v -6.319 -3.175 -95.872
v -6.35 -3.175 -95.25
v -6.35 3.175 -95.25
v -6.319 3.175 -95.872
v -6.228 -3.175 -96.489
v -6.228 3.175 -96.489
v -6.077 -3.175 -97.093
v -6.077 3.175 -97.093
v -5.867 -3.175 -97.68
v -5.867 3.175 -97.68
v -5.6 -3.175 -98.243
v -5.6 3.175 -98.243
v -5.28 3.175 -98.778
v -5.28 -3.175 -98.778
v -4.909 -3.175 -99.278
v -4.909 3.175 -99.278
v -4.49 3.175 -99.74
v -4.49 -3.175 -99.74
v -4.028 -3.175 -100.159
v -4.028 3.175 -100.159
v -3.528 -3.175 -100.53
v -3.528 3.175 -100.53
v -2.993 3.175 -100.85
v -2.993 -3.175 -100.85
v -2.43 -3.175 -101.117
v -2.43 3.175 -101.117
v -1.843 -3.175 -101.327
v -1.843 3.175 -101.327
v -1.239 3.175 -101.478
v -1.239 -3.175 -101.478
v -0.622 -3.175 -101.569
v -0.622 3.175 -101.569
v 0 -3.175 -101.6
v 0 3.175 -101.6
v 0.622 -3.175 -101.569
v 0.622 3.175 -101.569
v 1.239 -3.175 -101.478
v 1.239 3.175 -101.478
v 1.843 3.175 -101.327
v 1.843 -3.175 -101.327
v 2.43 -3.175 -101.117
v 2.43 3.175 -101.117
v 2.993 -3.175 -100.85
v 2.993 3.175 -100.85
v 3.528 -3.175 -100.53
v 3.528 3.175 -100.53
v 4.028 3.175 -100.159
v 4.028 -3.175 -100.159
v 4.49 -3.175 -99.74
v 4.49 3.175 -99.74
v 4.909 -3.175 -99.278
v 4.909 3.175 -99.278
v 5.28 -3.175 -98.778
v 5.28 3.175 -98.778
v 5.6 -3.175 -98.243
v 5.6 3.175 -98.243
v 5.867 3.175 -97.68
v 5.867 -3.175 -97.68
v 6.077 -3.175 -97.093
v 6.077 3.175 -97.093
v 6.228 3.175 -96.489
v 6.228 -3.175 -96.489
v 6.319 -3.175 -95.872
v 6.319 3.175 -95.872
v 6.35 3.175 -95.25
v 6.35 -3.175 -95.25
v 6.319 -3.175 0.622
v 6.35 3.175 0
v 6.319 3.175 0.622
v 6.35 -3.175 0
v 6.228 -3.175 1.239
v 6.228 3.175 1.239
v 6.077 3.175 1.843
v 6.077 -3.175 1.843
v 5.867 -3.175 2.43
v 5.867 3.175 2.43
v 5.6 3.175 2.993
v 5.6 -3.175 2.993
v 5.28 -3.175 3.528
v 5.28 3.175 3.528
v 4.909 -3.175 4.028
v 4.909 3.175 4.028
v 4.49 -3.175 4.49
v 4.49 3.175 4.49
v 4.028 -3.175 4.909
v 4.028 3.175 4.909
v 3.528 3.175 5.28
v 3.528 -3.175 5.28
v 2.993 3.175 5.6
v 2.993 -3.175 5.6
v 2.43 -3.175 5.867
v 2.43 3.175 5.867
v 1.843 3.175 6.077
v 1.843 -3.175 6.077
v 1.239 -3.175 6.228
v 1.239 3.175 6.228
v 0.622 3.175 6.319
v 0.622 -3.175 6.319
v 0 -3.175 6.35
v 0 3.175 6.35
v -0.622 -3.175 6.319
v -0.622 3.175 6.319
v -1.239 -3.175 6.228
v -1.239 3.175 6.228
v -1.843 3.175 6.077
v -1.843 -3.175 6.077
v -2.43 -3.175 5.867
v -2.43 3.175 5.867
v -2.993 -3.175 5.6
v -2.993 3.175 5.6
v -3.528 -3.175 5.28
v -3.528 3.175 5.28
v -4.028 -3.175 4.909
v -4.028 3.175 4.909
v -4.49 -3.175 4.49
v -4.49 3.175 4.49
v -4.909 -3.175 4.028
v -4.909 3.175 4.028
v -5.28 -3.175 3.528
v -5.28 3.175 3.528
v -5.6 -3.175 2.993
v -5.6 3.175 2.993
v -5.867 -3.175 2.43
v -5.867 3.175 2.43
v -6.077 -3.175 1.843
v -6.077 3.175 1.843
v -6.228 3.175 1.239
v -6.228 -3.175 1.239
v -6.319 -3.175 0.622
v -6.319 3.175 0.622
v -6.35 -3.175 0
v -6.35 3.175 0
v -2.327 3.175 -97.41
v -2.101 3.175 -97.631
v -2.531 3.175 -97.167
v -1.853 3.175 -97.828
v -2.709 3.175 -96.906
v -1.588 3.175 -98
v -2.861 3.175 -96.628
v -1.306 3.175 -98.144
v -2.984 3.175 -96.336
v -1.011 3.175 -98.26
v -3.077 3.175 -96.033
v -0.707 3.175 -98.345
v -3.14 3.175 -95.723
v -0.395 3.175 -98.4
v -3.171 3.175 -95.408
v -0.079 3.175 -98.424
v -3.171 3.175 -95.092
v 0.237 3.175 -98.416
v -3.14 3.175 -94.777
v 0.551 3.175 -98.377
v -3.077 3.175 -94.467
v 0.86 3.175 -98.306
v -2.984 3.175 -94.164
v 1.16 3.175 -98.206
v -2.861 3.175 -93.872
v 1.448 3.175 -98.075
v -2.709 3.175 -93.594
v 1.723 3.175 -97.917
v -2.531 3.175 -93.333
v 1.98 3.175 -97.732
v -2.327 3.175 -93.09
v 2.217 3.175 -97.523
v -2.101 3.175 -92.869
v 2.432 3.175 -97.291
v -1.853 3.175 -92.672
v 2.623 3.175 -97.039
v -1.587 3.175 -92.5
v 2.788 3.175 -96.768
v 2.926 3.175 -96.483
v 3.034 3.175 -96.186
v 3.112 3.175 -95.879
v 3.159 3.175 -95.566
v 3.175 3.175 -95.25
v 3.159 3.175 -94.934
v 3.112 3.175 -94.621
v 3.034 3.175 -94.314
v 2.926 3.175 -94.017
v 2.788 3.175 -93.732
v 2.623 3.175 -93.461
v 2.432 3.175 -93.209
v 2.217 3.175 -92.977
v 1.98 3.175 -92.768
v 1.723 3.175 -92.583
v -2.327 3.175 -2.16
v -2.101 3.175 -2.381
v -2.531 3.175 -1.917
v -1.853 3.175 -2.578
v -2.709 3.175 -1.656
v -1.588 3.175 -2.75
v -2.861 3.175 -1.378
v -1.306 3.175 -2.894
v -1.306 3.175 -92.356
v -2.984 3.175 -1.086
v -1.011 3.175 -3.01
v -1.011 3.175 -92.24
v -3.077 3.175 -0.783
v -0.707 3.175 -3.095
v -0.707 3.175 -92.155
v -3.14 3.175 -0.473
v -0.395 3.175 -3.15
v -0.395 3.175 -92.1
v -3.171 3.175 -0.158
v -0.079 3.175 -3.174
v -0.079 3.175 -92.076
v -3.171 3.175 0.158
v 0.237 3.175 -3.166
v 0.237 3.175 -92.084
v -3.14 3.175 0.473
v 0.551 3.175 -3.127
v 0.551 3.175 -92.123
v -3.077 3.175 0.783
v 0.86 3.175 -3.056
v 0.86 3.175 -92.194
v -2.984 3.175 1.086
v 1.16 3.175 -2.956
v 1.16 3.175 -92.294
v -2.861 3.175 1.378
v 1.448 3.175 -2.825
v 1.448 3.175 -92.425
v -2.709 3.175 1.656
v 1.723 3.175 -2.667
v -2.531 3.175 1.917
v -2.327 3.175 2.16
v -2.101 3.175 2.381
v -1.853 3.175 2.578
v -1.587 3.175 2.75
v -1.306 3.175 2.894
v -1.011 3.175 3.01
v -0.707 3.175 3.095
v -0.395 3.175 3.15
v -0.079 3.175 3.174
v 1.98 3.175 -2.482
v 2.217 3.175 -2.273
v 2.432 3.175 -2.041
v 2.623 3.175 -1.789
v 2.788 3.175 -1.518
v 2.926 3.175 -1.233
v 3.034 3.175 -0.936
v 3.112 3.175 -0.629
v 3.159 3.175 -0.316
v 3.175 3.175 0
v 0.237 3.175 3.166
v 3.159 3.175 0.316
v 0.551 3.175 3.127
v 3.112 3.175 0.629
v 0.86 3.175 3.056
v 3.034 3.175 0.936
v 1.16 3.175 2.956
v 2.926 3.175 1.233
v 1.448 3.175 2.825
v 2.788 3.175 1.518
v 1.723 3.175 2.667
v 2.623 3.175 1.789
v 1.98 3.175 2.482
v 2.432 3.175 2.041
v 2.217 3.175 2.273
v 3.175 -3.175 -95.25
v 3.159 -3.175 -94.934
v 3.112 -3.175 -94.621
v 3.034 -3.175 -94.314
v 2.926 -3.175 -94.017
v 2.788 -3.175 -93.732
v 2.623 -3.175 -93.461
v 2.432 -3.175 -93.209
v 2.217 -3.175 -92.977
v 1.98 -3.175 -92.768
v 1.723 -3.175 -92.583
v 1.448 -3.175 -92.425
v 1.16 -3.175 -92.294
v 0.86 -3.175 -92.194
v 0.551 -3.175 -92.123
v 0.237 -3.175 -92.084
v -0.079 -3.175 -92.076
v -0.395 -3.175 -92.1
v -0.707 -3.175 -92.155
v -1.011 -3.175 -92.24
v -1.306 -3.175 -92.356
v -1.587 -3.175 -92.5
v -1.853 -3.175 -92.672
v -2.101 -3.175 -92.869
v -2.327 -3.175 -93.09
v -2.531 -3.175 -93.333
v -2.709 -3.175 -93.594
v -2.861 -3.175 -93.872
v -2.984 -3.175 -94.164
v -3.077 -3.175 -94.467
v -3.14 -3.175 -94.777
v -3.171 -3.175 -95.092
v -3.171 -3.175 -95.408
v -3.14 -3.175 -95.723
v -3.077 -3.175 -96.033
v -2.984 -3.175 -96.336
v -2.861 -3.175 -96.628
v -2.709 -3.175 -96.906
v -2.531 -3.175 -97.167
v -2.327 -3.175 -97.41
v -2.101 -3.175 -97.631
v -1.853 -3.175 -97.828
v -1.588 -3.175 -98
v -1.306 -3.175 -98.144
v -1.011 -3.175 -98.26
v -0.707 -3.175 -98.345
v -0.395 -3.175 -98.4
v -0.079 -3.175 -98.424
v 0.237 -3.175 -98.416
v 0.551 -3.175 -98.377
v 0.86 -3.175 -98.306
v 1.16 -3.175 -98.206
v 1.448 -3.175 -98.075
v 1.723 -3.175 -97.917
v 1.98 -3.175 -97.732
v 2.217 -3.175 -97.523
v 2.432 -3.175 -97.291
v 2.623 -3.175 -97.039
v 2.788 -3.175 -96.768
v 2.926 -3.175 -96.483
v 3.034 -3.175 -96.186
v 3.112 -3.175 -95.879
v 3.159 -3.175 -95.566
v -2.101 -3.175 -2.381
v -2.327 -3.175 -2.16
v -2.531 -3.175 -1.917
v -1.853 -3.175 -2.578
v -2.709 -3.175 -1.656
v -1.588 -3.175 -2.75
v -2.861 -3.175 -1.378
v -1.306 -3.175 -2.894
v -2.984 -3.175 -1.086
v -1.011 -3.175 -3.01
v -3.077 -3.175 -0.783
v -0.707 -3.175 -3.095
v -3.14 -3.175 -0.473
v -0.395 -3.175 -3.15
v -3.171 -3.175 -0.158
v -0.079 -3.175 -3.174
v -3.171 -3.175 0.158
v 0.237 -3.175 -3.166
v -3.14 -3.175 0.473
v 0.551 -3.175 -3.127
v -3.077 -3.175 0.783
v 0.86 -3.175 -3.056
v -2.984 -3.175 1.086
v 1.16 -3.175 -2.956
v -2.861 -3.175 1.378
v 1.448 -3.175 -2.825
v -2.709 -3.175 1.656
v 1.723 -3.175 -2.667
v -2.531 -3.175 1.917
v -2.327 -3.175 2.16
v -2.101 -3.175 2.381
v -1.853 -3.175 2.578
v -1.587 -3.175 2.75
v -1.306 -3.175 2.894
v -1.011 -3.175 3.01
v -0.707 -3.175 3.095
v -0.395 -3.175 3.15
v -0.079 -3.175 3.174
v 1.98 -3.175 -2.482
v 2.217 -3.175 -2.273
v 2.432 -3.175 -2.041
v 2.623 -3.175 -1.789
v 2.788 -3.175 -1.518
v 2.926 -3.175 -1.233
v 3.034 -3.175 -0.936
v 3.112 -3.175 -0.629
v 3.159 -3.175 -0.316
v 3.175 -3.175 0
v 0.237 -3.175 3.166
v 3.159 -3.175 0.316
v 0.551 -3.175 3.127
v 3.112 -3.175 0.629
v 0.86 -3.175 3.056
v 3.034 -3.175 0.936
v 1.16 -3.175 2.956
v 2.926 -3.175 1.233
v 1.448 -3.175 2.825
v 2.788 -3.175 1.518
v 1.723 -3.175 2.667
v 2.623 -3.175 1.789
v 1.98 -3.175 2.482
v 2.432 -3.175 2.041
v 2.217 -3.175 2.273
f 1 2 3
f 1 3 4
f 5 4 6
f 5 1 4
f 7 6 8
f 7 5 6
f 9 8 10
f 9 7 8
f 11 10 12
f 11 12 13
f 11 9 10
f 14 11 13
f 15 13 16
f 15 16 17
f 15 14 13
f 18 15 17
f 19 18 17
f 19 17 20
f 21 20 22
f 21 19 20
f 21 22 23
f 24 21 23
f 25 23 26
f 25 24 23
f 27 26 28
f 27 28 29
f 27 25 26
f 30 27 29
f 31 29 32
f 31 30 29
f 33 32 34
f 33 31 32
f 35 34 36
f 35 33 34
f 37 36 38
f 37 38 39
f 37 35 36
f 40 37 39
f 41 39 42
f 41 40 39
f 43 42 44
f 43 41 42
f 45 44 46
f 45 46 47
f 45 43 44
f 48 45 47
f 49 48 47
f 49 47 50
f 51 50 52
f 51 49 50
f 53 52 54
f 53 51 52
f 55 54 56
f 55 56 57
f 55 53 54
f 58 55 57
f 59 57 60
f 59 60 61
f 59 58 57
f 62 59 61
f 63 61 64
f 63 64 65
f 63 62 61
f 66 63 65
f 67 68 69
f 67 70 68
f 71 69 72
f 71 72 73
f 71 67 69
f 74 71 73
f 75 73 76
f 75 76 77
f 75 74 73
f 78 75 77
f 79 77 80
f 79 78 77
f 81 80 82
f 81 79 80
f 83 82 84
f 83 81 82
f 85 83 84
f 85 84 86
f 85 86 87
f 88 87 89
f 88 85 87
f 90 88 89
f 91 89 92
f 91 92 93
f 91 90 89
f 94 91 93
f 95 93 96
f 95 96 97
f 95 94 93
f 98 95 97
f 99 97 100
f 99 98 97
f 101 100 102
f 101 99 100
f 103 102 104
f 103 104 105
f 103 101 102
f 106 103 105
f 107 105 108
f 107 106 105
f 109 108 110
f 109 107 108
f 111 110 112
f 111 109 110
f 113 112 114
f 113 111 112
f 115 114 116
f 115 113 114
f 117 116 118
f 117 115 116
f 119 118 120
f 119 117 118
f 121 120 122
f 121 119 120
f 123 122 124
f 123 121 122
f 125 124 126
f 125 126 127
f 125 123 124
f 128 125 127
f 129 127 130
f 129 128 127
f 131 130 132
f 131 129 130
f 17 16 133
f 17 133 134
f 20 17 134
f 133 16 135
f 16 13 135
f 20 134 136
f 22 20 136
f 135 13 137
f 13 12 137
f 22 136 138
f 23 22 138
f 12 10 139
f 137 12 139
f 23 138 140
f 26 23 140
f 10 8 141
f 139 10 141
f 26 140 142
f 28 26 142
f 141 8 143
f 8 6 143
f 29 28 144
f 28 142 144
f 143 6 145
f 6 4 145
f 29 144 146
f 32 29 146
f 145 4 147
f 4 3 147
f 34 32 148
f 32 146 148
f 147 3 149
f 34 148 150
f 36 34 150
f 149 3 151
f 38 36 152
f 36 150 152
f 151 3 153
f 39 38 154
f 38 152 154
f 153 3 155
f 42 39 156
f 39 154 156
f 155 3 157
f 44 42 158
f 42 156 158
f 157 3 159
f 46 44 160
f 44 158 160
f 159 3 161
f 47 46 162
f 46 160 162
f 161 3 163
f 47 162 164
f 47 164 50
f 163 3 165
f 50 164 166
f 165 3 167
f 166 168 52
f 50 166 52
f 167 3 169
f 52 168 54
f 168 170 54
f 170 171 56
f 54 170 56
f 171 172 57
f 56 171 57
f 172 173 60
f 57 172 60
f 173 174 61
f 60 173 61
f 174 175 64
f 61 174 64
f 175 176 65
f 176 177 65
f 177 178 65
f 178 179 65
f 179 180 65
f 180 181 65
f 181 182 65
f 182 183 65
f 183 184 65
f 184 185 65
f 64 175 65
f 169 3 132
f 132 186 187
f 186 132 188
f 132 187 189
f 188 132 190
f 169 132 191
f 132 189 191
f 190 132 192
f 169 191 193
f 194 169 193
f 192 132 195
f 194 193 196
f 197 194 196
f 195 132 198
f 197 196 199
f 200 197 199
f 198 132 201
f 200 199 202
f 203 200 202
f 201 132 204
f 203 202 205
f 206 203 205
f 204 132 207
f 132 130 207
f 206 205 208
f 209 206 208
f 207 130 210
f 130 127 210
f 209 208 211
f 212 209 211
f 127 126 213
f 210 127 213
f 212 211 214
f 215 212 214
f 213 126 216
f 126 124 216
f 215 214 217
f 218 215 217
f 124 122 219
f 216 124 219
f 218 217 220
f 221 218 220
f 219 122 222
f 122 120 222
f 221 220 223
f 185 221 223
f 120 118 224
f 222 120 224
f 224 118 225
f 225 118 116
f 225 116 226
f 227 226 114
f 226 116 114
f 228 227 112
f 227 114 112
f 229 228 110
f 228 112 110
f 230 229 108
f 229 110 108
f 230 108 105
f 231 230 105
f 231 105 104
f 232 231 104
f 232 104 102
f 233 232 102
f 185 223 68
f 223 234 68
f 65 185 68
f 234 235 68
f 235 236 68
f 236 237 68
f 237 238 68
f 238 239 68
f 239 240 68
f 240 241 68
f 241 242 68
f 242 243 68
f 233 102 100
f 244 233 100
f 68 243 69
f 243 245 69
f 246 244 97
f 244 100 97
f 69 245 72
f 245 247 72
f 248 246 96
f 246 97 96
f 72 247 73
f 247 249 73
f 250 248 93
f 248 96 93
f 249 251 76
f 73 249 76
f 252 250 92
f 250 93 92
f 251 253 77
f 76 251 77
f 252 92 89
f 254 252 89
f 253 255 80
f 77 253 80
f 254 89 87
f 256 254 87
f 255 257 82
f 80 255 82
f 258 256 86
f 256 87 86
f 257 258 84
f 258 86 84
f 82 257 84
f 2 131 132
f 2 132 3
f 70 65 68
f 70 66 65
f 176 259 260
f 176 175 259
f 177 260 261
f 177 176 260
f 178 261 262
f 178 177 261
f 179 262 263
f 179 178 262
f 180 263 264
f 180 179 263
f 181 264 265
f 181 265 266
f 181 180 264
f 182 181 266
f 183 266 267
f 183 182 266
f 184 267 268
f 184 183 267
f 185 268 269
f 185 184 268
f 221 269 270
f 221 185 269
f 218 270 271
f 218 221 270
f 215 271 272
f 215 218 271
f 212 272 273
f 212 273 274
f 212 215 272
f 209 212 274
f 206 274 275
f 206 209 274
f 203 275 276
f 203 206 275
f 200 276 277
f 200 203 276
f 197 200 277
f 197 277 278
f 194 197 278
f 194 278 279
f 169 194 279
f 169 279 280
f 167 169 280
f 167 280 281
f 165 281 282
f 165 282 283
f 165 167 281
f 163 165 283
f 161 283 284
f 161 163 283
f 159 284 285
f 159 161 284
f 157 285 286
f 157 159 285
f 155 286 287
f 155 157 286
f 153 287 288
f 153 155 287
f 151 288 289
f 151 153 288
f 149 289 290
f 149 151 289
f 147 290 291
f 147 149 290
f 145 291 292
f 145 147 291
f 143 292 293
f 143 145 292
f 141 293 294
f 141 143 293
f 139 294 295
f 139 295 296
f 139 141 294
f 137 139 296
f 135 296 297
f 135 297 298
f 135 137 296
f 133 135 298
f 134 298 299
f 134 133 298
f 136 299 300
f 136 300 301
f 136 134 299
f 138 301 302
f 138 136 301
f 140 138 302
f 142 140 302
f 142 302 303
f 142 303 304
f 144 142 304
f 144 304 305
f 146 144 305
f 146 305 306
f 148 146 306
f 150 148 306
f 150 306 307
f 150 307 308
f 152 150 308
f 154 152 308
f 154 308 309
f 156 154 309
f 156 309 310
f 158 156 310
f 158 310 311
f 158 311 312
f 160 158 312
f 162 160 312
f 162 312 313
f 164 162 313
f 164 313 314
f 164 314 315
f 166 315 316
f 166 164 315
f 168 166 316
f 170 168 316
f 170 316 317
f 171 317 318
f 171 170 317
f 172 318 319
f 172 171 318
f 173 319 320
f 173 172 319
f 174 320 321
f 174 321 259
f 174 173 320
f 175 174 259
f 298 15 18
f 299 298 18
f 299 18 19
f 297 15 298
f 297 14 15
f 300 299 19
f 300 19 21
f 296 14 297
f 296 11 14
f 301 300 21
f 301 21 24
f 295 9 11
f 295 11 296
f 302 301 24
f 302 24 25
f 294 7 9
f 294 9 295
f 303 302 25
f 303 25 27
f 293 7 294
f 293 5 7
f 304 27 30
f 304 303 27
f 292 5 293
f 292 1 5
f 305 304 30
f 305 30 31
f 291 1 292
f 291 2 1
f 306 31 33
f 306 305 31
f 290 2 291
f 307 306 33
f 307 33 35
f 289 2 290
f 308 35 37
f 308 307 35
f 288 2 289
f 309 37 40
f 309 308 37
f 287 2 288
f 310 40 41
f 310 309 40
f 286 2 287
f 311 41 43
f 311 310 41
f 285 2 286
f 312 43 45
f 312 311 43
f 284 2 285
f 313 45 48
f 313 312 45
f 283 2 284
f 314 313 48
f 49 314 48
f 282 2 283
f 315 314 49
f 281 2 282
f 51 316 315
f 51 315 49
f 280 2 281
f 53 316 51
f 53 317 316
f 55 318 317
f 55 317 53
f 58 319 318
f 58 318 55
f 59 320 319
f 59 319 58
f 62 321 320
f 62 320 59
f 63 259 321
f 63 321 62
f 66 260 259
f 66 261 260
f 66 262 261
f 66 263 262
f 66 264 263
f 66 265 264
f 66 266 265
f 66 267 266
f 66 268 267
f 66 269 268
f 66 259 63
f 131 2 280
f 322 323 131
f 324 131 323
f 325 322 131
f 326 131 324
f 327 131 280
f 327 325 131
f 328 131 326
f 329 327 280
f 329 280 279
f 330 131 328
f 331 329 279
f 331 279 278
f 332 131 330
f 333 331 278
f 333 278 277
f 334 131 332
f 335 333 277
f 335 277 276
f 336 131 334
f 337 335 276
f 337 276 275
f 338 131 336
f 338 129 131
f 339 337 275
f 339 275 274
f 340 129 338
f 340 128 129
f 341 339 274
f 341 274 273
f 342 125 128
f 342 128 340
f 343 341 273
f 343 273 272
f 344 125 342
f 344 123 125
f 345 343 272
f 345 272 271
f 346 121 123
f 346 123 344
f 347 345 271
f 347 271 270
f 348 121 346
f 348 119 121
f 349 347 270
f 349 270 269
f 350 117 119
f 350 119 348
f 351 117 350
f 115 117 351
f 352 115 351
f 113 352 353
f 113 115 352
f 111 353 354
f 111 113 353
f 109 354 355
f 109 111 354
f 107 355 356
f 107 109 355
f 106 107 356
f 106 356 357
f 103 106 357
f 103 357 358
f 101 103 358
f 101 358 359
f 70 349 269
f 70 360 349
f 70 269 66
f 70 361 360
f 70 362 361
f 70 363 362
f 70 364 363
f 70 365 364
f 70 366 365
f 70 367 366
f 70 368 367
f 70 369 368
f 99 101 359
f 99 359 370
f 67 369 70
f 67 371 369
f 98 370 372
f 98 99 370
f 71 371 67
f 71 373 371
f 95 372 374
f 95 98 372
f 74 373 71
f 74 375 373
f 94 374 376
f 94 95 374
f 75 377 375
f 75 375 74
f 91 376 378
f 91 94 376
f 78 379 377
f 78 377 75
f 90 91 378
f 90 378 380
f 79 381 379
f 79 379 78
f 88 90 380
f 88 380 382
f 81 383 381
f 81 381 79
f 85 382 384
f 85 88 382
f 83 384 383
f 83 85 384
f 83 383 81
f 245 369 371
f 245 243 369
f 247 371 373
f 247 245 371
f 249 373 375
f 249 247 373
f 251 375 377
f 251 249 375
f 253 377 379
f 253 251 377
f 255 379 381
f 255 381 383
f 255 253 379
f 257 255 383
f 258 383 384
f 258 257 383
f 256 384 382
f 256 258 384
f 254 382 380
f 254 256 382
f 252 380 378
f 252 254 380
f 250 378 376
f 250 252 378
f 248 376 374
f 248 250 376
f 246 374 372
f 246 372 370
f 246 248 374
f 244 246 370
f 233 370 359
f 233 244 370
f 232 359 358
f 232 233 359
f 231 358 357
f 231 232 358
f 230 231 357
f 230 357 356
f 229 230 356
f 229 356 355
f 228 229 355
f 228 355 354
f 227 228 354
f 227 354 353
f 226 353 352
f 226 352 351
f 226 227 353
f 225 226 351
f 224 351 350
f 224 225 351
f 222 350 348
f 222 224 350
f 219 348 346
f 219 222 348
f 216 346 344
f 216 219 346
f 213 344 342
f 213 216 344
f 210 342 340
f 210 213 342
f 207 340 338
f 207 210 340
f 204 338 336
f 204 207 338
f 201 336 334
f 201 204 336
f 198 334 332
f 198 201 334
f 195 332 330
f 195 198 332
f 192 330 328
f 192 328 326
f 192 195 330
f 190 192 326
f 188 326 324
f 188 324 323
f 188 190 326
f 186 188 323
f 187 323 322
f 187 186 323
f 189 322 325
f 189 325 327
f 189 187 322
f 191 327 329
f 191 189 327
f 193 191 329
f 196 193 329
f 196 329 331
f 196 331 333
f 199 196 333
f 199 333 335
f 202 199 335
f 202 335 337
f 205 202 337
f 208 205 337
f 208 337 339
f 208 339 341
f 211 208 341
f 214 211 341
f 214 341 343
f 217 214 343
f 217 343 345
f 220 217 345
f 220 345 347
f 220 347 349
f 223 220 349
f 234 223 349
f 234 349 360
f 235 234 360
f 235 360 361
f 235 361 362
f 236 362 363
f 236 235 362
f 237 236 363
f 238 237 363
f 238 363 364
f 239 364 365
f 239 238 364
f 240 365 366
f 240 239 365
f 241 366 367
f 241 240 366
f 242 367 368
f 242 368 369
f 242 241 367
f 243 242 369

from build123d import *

# Parameters (mm, degrees)
F0_R     = 3.175
F1_DEPTH = 3.175


with BuildPart() as f1:
    # F0 (on Front) → F1 (new body, symmetric)
    with BuildSketch(Plane.XZ):
        with BuildLine():
            ThreePointArc((6.35, -1e-06), (0, 6.35), (-6.35, -1e-06))
            Line((-6.35, -1e-06), (-6.35, -95.25))
            ThreePointArc((-6.35, -95.25), (0, -101.6), (6.35, -95.25))
            Line((6.35, -95.25), (6.35, -1e-06))
        make_face()
        with Locations((0, -95.25)):
            Circle(F0_R, mode=Mode.SUBTRACT)
        Circle(F0_R, mode=Mode.SUBTRACT)
    extrude(amount=F1_DEPTH, both=True)


solid = f1.part
